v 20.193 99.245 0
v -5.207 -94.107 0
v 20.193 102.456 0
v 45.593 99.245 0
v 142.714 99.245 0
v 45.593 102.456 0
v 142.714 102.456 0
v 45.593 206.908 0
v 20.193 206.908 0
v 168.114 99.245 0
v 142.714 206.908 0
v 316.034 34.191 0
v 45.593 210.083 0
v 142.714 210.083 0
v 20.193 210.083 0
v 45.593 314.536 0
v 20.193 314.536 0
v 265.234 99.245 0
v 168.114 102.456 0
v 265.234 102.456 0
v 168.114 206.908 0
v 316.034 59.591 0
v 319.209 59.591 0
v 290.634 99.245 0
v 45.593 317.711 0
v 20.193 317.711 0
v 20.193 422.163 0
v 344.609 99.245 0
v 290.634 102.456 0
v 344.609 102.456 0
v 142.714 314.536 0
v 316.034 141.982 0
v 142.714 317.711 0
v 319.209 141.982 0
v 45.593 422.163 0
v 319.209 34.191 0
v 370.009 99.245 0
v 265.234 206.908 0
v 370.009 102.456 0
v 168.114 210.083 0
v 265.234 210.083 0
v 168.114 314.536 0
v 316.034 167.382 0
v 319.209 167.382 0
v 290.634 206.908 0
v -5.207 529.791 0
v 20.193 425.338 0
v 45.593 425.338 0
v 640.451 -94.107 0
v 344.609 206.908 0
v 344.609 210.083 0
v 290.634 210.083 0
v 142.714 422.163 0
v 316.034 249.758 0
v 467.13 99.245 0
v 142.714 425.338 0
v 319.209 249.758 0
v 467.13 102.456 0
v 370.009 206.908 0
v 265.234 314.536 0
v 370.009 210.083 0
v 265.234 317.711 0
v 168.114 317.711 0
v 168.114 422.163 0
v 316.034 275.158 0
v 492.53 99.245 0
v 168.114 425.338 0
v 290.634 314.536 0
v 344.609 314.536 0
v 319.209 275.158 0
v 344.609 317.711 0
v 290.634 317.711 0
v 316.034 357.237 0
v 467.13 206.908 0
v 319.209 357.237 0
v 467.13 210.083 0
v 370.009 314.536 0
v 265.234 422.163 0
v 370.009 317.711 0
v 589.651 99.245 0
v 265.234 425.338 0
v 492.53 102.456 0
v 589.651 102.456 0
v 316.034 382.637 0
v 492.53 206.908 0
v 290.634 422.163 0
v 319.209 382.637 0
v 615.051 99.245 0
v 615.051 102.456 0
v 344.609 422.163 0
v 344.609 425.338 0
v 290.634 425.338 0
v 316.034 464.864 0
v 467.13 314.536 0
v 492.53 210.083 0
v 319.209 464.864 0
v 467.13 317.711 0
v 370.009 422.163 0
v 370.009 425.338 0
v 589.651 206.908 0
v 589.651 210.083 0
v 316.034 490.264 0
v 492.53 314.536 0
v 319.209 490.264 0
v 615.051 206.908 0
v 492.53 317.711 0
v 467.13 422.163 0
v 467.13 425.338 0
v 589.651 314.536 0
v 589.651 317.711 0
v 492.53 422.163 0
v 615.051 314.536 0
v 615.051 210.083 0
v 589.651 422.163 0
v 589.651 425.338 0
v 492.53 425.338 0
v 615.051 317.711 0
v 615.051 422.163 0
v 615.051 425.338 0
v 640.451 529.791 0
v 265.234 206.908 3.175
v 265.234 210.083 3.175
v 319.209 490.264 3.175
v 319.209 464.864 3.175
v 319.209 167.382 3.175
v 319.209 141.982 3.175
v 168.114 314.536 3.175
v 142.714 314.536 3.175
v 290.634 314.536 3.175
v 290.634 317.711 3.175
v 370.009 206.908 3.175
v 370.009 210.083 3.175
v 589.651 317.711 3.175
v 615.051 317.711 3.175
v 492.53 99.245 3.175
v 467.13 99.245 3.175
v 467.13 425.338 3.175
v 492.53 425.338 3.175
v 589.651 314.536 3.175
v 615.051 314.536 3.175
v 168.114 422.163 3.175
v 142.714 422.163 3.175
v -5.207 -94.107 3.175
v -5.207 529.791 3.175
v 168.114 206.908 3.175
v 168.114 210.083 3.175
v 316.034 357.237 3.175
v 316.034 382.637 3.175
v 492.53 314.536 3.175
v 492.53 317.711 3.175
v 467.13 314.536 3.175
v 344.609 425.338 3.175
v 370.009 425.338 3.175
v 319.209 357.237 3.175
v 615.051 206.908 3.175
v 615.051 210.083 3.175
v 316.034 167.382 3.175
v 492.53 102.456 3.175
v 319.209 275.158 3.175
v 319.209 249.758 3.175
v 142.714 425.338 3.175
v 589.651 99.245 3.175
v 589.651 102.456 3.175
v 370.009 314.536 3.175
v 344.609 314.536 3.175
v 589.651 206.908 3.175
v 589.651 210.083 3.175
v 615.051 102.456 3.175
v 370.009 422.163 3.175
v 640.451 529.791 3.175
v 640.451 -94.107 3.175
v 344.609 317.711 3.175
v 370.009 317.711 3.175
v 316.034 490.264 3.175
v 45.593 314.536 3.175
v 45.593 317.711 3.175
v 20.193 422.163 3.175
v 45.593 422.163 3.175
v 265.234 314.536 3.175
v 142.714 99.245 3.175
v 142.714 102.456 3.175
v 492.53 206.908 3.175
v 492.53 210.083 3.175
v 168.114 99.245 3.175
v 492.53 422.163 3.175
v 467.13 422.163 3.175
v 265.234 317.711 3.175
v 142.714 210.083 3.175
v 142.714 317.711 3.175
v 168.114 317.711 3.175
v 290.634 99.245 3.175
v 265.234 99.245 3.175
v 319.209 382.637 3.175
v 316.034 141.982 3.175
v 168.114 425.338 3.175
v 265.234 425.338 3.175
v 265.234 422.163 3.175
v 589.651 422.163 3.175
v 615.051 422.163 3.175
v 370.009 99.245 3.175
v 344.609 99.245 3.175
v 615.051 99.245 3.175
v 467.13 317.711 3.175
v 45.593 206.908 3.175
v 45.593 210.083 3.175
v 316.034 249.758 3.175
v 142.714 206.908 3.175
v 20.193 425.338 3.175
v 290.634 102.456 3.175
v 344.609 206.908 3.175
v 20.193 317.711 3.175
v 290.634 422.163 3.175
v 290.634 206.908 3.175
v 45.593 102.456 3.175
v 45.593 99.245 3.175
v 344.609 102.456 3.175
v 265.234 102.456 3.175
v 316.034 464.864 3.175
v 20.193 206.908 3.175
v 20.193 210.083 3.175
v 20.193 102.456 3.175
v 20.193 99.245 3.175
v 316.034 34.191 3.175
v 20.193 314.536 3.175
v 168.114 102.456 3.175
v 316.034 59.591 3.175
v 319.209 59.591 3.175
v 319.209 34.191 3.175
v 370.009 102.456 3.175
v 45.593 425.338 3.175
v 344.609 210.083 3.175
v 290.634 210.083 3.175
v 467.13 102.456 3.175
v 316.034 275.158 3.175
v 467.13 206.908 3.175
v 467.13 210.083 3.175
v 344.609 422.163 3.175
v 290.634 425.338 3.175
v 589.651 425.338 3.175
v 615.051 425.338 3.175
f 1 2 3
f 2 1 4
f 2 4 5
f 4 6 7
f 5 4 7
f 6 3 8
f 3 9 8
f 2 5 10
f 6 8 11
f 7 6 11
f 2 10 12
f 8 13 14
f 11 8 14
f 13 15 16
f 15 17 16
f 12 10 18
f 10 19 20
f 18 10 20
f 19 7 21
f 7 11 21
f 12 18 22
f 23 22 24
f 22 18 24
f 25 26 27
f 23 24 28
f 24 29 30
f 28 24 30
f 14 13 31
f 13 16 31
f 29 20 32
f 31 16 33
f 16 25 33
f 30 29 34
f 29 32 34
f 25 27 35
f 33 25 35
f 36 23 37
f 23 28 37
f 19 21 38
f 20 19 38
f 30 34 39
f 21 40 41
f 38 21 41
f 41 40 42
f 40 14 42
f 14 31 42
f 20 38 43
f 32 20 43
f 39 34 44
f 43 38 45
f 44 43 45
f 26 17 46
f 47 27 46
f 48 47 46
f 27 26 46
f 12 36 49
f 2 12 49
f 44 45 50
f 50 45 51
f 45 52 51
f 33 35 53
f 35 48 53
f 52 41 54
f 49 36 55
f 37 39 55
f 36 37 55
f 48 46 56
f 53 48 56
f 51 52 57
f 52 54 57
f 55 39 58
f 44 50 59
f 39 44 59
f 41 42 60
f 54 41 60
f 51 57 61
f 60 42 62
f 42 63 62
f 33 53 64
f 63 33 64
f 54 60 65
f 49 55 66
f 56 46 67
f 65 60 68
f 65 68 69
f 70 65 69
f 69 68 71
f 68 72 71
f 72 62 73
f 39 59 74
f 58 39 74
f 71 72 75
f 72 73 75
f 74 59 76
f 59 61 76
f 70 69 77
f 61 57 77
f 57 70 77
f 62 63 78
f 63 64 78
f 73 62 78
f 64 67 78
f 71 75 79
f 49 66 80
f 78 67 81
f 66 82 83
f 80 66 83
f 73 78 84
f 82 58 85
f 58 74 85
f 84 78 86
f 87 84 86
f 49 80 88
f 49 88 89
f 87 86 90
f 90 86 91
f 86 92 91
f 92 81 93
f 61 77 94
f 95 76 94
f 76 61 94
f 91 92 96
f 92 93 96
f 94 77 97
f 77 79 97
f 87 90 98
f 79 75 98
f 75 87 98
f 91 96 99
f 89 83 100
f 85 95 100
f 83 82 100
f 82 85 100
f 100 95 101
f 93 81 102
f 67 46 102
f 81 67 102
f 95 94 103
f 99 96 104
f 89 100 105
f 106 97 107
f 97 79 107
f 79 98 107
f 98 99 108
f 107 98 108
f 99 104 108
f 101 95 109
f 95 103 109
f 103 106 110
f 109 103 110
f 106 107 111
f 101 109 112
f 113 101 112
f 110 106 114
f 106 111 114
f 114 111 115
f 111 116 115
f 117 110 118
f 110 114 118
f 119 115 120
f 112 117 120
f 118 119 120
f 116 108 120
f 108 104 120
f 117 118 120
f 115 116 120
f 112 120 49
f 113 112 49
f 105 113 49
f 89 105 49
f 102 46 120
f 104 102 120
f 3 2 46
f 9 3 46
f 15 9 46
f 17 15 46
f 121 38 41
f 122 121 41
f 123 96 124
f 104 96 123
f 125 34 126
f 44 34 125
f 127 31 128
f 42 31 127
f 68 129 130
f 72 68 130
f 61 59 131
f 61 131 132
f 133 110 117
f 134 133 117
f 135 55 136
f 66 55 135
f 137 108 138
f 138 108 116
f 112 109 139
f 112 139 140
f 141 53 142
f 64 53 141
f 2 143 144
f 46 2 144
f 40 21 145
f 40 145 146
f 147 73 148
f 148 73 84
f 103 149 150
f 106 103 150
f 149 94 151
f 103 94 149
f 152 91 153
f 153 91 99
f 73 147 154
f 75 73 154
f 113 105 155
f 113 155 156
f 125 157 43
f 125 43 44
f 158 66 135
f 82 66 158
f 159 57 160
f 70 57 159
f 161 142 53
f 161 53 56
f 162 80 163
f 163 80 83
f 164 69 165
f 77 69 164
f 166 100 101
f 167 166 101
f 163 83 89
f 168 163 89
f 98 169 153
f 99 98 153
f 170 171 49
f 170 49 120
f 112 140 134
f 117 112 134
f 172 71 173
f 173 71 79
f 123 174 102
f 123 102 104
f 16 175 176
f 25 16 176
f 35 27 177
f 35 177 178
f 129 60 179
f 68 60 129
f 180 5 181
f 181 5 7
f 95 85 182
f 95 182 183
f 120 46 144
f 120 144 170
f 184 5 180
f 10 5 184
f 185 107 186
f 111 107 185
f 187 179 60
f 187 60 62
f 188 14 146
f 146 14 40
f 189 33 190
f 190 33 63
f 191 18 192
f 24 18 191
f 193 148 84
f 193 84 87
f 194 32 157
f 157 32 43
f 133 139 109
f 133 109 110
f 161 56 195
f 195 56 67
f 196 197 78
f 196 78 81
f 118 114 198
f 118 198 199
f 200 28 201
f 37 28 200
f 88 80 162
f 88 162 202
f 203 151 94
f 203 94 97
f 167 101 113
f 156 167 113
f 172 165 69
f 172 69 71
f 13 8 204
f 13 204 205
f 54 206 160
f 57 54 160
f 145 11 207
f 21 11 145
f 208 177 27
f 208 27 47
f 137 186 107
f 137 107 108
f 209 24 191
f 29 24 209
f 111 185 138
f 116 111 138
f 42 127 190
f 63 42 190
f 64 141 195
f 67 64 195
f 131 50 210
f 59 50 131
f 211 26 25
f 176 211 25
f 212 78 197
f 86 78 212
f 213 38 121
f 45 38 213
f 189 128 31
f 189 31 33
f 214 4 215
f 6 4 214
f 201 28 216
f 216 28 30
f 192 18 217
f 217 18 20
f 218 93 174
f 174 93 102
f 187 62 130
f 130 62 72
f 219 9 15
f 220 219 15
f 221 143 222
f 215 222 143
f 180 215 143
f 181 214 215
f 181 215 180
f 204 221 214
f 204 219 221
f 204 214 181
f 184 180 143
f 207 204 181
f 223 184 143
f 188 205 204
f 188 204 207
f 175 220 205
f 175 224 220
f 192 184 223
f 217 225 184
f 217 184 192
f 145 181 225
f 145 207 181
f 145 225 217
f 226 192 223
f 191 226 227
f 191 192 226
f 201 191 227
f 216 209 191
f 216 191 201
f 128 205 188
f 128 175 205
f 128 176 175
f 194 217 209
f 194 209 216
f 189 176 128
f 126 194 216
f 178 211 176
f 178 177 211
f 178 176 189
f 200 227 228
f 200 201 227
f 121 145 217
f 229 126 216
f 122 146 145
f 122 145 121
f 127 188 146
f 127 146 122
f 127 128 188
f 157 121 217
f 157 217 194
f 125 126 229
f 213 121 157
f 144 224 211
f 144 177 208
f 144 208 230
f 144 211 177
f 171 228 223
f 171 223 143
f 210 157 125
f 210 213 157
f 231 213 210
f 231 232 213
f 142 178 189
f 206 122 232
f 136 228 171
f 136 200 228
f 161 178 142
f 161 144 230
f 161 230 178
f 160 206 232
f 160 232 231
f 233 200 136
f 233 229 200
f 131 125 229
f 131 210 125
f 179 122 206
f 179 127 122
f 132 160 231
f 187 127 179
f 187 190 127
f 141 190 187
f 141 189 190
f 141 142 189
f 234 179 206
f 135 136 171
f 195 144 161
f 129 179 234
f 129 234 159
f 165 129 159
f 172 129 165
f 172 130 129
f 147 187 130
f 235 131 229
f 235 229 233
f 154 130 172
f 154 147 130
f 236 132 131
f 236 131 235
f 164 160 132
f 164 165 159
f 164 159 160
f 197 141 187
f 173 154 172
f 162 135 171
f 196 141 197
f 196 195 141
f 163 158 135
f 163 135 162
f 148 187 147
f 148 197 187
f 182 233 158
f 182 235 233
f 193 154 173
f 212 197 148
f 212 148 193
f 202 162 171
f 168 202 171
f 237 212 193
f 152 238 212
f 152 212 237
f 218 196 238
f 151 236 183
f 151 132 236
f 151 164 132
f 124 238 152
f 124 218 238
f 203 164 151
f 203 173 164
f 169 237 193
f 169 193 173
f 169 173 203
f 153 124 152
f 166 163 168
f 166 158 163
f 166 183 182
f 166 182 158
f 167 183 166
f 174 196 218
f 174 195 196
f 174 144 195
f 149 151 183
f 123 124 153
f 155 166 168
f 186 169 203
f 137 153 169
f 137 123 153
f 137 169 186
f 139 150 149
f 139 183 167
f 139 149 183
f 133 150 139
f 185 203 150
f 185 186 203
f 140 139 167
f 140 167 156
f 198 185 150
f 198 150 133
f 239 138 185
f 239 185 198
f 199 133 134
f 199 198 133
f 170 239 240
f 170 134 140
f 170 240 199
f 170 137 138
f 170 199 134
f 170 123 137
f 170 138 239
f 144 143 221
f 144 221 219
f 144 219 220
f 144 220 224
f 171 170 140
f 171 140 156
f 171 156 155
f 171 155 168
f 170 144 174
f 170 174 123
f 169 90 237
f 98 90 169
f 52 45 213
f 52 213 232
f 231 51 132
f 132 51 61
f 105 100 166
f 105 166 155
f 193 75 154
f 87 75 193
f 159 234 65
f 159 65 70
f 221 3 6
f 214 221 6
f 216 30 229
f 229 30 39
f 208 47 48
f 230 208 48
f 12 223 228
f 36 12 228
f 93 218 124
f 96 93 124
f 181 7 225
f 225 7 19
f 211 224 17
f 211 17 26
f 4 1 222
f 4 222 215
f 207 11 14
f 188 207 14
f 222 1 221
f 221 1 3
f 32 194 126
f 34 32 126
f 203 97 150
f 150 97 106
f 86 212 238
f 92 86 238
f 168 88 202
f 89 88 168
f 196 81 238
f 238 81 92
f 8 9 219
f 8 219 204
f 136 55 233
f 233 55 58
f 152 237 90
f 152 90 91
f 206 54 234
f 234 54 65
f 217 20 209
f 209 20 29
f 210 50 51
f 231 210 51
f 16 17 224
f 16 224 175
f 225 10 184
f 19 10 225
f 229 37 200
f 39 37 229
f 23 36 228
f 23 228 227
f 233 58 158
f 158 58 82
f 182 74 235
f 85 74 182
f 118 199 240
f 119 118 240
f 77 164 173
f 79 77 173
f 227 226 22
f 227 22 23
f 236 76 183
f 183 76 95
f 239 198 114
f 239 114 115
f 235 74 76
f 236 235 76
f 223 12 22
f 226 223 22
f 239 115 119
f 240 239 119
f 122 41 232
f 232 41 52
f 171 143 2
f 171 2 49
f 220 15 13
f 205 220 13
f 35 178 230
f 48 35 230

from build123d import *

# Parameters (mm, degrees)
SKETCH8_W           = 645.65784
SKETCH8_H           = 534.99766
SKETCH8_W_2         = 3.175
SKETCH8_H_2         = 25.4
SKETCH8_W_3         = 25.4
SKETCH8_H_3         = 3.175
SKETCH8_H_4         = 3.21056
BOSS_EXTRUDE2_DEPTH = 3.175
SKETCH10_W          = 645.65784
SKETCH10_H          = 88.9
BOSS_EXTRUDE6_DEPTH = 3.175


with BuildPart() as part:
    # Sketch8 → Boss-Extrude2 (new body)
    with BuildSketch(Plane.XY):
        with Locations((317.62192, 262.29183)):
            Rectangle(SKETCH8_W, SKETCH8_H)
        with Locations((317.62192, 477.56445)):
            Rectangle(SKETCH8_W_2, SKETCH8_H_2, mode=Mode.SUBTRACT)
        with Locations((317.62192, 369.93703)):
            Rectangle(SKETCH8_W_2, SKETCH8_H_2, mode=Mode.SUBTRACT)
        with Locations((317.62192, 262.458260384)):
            Rectangle(SKETCH8_W_2, SKETCH8_H_2, mode=Mode.SUBTRACT)
        with Locations((317.62192, 154.681954488)):
            Rectangle(SKETCH8_W_2, SKETCH8_H_2, mode=Mode.SUBTRACT)
        with Locations((317.62192, 46.891109833)):
            Rectangle(SKETCH8_W_2, SKETCH8_H_2, mode=Mode.SUBTRACT)
        with Locations((32.893, 423.75074)):
            Rectangle(SKETCH8_W_3, SKETCH8_H_3, mode=Mode.SUBTRACT)
        with Locations((155.41371, 423.75074)):
            Rectangle(SKETCH8_W_3, SKETCH8_H_3, mode=Mode.SUBTRACT)
        with Locations((32.893, 316.12332)):
            Rectangle(SKETCH8_W_3, SKETCH8_H_3, mode=Mode.SUBTRACT)
        with Locations((32.893, 208.4959)):
            Rectangle(SKETCH8_W_3, SKETCH8_H_3, mode=Mode.SUBTRACT)
        with Locations((32.893, 100.8507)):
            Rectangle(SKETCH8_W_3, SKETCH8_H_4, mode=Mode.SUBTRACT)
        with Locations((277.93442, 423.75074)):
            Rectangle(SKETCH8_W_3, SKETCH8_H_3, mode=Mode.SUBTRACT)
        with Locations((155.41371, 316.12332)):
            Rectangle(SKETCH8_W_3, SKETCH8_H_3, mode=Mode.SUBTRACT)
        with Locations((155.41371, 208.4959)):
            Rectangle(SKETCH8_W_3, SKETCH8_H_3, mode=Mode.SUBTRACT)
        with Locations((155.41371, 100.8507)):
            Rectangle(SKETCH8_W_3, SKETCH8_H_4, mode=Mode.SUBTRACT)
        with Locations((277.93442, 316.12332)):
            Rectangle(SKETCH8_W_3, SKETCH8_H_3, mode=Mode.SUBTRACT)
        with Locations((277.93442, 208.4959)):
            Rectangle(SKETCH8_W_3, SKETCH8_H_3, mode=Mode.SUBTRACT)
        with Locations((277.93442, 100.8507)):
            Rectangle(SKETCH8_W_3, SKETCH8_H_4, mode=Mode.SUBTRACT)
        with Locations((602.35084, 100.8507)):
            Rectangle(SKETCH8_W_3, SKETCH8_H_4, mode=Mode.SUBTRACT)
        with Locations((479.83013, 100.8507)):
            Rectangle(SKETCH8_W_3, SKETCH8_H_4, mode=Mode.SUBTRACT)
        with Locations((357.30942, 100.8507)):
            Rectangle(SKETCH8_W_3, SKETCH8_H_4, mode=Mode.SUBTRACT)
        with Locations((357.30942, 208.4959)):
            Rectangle(SKETCH8_W_3, SKETCH8_H_3, mode=Mode.SUBTRACT)
        with Locations((479.83013, 208.4959)):
            Rectangle(SKETCH8_W_3, SKETCH8_H_3, mode=Mode.SUBTRACT)
        with Locations((602.35084, 208.4959)):
            Rectangle(SKETCH8_W_3, SKETCH8_H_3, mode=Mode.SUBTRACT)
        with Locations((602.35084, 316.12332)):
            Rectangle(SKETCH8_W_3, SKETCH8_H_3, mode=Mode.SUBTRACT)
        with Locations((479.83013, 316.12332)):
            Rectangle(SKETCH8_W_3, SKETCH8_H_3, mode=Mode.SUBTRACT)
        with Locations((357.30942, 316.12332)):
            Rectangle(SKETCH8_W_3, SKETCH8_H_3, mode=Mode.SUBTRACT)
        with Locations((357.30942, 423.75074)):
            Rectangle(SKETCH8_W_3, SKETCH8_H_3, mode=Mode.SUBTRACT)
        with Locations((479.83013, 423.75074)):
            Rectangle(SKETCH8_W_3, SKETCH8_H_3, mode=Mode.SUBTRACT)
        with Locations((602.35084, 423.75074)):
            Rectangle(SKETCH8_W_3, SKETCH8_H_3, mode=Mode.SUBTRACT)
    extrude(amount=BOSS_EXTRUDE2_DEPTH)

    # Sketch10 → Boss-Extrude6 (add, through all)
    with BuildSketch(Plane.XY.offset(3.175)):
        with Locations((317.62192, -49.657)):
            Rectangle(SKETCH10_W, SKETCH10_H)
    extrude(amount=-BOSS_EXTRUDE6_DEPTH)


solid = part.part
